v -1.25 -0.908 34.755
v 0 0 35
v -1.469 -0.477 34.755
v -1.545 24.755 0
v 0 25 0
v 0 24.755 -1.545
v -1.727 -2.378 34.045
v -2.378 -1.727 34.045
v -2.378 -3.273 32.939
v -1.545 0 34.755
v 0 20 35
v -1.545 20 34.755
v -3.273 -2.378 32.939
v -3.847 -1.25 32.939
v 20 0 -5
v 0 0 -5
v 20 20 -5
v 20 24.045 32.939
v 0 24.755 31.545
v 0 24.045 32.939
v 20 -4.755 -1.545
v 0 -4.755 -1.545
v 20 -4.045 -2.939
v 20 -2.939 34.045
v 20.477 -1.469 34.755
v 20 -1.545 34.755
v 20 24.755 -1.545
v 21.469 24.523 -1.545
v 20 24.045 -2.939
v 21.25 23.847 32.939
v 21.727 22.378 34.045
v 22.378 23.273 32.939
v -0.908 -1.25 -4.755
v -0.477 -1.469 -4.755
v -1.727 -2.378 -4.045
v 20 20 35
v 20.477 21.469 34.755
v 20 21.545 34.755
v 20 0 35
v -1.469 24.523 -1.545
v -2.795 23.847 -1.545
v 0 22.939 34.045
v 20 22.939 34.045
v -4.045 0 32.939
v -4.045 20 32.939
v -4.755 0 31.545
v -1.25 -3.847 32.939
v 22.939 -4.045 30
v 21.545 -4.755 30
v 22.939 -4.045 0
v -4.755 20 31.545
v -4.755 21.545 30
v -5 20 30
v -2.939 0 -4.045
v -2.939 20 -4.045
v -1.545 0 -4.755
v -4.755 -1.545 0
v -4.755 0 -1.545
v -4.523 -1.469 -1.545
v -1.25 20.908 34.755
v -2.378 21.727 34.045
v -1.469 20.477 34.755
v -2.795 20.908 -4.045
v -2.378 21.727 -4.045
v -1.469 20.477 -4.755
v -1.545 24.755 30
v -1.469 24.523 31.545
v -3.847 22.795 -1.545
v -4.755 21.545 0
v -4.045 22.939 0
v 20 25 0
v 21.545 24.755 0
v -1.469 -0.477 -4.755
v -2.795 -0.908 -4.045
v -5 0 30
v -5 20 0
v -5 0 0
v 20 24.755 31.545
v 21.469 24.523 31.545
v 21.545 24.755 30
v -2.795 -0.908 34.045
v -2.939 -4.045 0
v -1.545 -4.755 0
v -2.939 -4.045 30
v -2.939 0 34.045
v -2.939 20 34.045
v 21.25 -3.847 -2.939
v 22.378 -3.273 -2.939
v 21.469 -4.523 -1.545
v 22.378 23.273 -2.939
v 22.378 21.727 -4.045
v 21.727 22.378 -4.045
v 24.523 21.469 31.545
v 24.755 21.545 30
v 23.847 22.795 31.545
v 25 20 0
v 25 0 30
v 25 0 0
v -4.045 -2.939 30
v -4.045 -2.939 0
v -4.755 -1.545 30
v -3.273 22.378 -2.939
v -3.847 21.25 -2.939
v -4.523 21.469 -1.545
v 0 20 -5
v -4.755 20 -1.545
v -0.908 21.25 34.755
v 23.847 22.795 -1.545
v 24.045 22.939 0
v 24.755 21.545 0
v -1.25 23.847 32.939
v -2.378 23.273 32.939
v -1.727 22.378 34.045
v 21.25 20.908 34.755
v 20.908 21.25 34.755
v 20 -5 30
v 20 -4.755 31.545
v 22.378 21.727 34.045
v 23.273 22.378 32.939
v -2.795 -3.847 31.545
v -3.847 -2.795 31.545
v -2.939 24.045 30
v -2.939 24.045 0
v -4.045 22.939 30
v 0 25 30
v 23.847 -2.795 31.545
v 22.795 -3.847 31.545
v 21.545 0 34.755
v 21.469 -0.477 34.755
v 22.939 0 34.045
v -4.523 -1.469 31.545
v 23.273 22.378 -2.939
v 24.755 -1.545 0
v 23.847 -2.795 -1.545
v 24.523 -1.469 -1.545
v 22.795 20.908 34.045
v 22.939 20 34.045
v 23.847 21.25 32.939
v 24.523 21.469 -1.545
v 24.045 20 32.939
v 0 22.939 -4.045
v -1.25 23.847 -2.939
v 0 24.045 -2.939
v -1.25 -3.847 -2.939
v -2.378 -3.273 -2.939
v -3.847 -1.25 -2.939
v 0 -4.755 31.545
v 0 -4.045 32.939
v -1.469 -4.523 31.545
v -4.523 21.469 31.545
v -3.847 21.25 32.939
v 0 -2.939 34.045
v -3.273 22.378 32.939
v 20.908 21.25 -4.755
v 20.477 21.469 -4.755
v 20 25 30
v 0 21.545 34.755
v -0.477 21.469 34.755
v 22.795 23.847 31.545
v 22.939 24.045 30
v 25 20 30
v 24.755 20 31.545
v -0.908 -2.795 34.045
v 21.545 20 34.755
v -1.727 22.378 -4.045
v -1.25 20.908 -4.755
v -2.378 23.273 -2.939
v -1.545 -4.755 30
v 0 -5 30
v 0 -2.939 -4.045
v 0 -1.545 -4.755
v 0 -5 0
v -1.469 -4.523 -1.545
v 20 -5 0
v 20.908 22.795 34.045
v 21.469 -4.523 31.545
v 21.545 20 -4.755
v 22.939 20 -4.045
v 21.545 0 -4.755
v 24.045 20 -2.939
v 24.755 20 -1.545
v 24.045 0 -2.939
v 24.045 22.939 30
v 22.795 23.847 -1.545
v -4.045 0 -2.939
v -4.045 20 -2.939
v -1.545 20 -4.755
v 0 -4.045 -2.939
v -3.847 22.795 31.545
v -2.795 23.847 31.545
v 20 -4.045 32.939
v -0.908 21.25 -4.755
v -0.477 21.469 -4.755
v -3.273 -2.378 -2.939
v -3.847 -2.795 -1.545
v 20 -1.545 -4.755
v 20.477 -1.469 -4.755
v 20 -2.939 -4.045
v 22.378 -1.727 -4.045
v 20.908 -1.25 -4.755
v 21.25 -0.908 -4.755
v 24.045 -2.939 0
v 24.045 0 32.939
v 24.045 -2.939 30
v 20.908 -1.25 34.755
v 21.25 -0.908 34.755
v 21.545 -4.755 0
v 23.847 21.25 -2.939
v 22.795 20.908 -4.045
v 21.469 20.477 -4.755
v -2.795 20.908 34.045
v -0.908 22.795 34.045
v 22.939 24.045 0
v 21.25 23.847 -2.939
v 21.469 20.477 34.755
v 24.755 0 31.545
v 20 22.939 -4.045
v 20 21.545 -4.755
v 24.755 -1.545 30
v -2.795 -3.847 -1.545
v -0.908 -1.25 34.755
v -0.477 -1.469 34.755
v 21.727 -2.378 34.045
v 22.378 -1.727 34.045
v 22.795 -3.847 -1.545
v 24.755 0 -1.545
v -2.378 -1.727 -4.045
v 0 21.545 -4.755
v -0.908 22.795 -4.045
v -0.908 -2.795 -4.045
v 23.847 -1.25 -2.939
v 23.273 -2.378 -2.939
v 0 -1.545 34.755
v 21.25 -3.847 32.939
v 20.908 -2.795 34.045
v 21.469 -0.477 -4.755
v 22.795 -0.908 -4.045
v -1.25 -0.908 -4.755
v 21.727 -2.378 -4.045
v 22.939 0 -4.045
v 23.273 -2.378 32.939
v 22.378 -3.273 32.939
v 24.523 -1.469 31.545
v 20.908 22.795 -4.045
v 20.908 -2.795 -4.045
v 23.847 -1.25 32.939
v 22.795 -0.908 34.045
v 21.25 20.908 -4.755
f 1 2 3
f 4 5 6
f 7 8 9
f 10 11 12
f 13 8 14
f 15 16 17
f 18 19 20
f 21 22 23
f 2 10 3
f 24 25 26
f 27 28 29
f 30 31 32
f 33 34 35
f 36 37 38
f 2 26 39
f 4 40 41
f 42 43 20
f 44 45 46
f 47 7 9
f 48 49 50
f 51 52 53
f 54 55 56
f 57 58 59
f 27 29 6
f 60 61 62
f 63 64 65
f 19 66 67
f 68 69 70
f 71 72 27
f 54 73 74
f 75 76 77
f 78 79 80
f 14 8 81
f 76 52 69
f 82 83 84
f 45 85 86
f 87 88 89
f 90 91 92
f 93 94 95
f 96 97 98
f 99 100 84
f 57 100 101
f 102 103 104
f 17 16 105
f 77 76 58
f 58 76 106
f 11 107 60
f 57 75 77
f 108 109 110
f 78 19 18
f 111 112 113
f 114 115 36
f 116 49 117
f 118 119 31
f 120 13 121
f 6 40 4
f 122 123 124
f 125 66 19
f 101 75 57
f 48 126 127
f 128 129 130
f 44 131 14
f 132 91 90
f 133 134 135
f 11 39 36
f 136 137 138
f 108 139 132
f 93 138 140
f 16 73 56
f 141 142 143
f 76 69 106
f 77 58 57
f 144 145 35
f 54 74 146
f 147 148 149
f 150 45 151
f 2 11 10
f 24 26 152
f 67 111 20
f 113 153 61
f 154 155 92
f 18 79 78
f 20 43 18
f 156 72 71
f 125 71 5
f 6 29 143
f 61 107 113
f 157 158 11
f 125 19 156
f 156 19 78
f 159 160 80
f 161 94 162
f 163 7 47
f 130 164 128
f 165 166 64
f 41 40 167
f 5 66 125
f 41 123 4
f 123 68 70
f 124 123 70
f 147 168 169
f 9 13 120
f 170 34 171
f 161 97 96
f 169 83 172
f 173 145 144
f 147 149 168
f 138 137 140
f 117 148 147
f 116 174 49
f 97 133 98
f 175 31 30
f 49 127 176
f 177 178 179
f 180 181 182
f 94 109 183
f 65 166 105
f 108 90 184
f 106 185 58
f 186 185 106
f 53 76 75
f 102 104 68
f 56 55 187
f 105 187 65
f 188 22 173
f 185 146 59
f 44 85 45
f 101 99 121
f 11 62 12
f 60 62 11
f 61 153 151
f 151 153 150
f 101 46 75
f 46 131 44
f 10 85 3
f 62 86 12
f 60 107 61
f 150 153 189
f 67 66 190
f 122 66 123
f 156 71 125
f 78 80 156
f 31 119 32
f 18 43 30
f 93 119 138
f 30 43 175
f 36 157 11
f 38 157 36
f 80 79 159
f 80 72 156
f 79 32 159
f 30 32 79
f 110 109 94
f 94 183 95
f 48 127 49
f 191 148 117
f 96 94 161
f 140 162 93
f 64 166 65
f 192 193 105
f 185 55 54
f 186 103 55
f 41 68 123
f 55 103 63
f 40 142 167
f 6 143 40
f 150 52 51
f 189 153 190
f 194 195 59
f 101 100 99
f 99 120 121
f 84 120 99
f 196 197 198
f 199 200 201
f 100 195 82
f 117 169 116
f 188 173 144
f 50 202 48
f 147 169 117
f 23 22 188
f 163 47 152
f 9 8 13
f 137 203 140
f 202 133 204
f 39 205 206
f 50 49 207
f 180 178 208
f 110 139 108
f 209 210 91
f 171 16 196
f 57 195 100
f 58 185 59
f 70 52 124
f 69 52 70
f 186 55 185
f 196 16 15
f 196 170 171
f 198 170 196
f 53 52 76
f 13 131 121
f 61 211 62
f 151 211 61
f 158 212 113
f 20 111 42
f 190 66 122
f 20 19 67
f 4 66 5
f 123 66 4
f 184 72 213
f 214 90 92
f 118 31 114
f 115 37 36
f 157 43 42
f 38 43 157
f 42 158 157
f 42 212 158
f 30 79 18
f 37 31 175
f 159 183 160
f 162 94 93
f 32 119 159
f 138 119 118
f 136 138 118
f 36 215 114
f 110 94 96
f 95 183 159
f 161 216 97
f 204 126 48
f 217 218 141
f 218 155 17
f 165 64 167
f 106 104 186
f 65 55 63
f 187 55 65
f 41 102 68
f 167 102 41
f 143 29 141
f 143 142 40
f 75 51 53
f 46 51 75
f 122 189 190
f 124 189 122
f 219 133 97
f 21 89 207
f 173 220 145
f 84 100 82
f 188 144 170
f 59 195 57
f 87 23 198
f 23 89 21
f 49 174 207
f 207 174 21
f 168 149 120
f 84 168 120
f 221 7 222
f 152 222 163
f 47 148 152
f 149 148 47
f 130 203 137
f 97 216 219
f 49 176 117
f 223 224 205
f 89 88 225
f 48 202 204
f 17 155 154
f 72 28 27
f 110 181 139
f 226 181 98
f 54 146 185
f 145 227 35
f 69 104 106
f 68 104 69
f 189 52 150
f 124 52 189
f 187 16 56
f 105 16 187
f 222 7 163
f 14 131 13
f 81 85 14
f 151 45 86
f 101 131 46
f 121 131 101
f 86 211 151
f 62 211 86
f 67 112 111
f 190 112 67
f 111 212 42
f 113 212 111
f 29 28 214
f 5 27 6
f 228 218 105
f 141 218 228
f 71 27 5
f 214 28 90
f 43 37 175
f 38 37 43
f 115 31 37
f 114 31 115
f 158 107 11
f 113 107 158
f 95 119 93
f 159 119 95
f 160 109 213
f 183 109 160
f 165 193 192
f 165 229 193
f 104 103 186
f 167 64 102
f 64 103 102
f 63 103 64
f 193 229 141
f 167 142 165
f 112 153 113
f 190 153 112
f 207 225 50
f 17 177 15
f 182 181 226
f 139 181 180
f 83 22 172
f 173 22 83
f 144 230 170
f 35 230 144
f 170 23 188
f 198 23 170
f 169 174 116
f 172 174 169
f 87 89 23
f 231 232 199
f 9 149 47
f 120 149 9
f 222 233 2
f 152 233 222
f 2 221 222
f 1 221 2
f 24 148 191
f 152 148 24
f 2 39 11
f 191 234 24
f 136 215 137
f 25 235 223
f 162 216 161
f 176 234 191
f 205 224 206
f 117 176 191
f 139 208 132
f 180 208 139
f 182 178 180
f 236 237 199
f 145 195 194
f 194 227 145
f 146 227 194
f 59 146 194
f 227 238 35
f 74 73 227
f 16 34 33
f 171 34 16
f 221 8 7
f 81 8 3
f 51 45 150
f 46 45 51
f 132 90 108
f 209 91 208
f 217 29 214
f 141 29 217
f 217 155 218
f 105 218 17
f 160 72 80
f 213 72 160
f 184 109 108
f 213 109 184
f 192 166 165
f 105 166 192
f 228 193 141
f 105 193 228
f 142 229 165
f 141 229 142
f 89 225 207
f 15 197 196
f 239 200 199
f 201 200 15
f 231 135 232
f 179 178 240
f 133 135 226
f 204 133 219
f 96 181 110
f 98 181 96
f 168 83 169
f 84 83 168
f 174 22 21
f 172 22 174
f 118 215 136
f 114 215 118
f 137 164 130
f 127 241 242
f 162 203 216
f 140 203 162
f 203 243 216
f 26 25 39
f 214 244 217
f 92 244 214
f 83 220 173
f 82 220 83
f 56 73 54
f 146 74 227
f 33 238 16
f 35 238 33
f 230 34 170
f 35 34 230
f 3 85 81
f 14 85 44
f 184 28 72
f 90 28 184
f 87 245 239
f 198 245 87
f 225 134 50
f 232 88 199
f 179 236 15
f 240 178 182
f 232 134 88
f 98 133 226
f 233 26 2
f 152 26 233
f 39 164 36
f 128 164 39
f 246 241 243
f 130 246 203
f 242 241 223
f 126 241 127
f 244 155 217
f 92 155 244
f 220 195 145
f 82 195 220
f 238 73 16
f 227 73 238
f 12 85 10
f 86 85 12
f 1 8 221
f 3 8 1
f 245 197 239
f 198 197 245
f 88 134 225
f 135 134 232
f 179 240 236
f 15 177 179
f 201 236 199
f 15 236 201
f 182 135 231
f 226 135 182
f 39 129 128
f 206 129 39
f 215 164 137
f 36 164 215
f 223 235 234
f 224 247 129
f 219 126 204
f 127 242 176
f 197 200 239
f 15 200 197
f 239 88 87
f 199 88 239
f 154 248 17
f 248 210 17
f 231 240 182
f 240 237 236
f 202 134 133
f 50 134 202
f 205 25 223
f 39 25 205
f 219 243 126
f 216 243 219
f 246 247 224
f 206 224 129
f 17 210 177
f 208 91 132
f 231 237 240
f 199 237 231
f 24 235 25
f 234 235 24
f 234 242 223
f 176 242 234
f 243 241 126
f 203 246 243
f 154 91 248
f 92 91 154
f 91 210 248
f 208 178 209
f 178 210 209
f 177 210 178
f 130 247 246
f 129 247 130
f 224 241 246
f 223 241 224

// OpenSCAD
 module halfcircle(r) {
     difference() {
       circle(r);
       translate([-r,0])square([r*2,r]);
     }
   }

   module sphere_alternate(r) {
     rotate_extrude()
       rotate([0,0,90])halfcircle(r);
   } 

$fn=20;
   minkowski() {
      cube([20,20,30]);
      sphere_alternate(5);
   } 
